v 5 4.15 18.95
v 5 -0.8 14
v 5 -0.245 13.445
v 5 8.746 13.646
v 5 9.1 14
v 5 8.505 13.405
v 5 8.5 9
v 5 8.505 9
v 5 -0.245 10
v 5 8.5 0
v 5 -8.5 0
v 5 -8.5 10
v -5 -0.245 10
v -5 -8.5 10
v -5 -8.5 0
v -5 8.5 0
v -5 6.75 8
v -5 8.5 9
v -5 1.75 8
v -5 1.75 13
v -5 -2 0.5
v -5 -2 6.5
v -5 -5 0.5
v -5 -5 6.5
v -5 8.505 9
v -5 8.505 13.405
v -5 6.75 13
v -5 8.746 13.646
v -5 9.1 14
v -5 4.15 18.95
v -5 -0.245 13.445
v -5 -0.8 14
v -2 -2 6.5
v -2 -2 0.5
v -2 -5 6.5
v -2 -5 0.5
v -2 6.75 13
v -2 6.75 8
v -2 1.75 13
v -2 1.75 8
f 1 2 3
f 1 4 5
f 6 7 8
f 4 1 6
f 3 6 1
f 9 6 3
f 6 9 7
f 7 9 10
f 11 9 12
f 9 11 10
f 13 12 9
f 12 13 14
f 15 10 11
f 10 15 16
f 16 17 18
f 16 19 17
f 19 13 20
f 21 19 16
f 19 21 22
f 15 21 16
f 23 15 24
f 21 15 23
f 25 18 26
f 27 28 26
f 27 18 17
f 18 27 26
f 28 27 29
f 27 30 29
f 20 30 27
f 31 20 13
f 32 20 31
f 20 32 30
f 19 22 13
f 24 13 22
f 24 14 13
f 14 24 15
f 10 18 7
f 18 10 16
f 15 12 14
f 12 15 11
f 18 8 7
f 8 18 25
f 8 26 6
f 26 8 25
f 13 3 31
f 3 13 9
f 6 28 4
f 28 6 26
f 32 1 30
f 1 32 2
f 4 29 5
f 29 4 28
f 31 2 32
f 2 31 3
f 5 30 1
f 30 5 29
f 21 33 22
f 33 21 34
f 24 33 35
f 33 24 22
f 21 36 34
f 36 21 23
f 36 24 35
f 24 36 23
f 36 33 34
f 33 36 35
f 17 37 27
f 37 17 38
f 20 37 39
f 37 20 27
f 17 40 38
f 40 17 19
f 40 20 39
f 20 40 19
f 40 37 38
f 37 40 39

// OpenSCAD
difference(){
    translate([0,0,5]){color("orange") cube([10, 17, 10],center=true);
    translate([0,4.13,6.5])color("orange") cube([10, 8.75, 5],center=true);
        
    translate([0,4.15,9])rotate([0,45,90])color("orange") cube([7, 10, 6],center=true);
   translate([0,4.15,9])rotate([0,-45,90])color("orange") cube([7, 10, 7],center=true);
   }
   rotate([0,0,90]){translate([-5,2,.5])cube([3,4,6]);
   translate([1.75,2,8])cube([5,5,5]); }}
   translate([-2.5,7,10])color("orange") cube([.25, .25, 5],center=true);
   translate([-2.5,7,6.5])rotate([0,-90,0])color("orange") cube([.25, .25, 5],center=true);
    
    
